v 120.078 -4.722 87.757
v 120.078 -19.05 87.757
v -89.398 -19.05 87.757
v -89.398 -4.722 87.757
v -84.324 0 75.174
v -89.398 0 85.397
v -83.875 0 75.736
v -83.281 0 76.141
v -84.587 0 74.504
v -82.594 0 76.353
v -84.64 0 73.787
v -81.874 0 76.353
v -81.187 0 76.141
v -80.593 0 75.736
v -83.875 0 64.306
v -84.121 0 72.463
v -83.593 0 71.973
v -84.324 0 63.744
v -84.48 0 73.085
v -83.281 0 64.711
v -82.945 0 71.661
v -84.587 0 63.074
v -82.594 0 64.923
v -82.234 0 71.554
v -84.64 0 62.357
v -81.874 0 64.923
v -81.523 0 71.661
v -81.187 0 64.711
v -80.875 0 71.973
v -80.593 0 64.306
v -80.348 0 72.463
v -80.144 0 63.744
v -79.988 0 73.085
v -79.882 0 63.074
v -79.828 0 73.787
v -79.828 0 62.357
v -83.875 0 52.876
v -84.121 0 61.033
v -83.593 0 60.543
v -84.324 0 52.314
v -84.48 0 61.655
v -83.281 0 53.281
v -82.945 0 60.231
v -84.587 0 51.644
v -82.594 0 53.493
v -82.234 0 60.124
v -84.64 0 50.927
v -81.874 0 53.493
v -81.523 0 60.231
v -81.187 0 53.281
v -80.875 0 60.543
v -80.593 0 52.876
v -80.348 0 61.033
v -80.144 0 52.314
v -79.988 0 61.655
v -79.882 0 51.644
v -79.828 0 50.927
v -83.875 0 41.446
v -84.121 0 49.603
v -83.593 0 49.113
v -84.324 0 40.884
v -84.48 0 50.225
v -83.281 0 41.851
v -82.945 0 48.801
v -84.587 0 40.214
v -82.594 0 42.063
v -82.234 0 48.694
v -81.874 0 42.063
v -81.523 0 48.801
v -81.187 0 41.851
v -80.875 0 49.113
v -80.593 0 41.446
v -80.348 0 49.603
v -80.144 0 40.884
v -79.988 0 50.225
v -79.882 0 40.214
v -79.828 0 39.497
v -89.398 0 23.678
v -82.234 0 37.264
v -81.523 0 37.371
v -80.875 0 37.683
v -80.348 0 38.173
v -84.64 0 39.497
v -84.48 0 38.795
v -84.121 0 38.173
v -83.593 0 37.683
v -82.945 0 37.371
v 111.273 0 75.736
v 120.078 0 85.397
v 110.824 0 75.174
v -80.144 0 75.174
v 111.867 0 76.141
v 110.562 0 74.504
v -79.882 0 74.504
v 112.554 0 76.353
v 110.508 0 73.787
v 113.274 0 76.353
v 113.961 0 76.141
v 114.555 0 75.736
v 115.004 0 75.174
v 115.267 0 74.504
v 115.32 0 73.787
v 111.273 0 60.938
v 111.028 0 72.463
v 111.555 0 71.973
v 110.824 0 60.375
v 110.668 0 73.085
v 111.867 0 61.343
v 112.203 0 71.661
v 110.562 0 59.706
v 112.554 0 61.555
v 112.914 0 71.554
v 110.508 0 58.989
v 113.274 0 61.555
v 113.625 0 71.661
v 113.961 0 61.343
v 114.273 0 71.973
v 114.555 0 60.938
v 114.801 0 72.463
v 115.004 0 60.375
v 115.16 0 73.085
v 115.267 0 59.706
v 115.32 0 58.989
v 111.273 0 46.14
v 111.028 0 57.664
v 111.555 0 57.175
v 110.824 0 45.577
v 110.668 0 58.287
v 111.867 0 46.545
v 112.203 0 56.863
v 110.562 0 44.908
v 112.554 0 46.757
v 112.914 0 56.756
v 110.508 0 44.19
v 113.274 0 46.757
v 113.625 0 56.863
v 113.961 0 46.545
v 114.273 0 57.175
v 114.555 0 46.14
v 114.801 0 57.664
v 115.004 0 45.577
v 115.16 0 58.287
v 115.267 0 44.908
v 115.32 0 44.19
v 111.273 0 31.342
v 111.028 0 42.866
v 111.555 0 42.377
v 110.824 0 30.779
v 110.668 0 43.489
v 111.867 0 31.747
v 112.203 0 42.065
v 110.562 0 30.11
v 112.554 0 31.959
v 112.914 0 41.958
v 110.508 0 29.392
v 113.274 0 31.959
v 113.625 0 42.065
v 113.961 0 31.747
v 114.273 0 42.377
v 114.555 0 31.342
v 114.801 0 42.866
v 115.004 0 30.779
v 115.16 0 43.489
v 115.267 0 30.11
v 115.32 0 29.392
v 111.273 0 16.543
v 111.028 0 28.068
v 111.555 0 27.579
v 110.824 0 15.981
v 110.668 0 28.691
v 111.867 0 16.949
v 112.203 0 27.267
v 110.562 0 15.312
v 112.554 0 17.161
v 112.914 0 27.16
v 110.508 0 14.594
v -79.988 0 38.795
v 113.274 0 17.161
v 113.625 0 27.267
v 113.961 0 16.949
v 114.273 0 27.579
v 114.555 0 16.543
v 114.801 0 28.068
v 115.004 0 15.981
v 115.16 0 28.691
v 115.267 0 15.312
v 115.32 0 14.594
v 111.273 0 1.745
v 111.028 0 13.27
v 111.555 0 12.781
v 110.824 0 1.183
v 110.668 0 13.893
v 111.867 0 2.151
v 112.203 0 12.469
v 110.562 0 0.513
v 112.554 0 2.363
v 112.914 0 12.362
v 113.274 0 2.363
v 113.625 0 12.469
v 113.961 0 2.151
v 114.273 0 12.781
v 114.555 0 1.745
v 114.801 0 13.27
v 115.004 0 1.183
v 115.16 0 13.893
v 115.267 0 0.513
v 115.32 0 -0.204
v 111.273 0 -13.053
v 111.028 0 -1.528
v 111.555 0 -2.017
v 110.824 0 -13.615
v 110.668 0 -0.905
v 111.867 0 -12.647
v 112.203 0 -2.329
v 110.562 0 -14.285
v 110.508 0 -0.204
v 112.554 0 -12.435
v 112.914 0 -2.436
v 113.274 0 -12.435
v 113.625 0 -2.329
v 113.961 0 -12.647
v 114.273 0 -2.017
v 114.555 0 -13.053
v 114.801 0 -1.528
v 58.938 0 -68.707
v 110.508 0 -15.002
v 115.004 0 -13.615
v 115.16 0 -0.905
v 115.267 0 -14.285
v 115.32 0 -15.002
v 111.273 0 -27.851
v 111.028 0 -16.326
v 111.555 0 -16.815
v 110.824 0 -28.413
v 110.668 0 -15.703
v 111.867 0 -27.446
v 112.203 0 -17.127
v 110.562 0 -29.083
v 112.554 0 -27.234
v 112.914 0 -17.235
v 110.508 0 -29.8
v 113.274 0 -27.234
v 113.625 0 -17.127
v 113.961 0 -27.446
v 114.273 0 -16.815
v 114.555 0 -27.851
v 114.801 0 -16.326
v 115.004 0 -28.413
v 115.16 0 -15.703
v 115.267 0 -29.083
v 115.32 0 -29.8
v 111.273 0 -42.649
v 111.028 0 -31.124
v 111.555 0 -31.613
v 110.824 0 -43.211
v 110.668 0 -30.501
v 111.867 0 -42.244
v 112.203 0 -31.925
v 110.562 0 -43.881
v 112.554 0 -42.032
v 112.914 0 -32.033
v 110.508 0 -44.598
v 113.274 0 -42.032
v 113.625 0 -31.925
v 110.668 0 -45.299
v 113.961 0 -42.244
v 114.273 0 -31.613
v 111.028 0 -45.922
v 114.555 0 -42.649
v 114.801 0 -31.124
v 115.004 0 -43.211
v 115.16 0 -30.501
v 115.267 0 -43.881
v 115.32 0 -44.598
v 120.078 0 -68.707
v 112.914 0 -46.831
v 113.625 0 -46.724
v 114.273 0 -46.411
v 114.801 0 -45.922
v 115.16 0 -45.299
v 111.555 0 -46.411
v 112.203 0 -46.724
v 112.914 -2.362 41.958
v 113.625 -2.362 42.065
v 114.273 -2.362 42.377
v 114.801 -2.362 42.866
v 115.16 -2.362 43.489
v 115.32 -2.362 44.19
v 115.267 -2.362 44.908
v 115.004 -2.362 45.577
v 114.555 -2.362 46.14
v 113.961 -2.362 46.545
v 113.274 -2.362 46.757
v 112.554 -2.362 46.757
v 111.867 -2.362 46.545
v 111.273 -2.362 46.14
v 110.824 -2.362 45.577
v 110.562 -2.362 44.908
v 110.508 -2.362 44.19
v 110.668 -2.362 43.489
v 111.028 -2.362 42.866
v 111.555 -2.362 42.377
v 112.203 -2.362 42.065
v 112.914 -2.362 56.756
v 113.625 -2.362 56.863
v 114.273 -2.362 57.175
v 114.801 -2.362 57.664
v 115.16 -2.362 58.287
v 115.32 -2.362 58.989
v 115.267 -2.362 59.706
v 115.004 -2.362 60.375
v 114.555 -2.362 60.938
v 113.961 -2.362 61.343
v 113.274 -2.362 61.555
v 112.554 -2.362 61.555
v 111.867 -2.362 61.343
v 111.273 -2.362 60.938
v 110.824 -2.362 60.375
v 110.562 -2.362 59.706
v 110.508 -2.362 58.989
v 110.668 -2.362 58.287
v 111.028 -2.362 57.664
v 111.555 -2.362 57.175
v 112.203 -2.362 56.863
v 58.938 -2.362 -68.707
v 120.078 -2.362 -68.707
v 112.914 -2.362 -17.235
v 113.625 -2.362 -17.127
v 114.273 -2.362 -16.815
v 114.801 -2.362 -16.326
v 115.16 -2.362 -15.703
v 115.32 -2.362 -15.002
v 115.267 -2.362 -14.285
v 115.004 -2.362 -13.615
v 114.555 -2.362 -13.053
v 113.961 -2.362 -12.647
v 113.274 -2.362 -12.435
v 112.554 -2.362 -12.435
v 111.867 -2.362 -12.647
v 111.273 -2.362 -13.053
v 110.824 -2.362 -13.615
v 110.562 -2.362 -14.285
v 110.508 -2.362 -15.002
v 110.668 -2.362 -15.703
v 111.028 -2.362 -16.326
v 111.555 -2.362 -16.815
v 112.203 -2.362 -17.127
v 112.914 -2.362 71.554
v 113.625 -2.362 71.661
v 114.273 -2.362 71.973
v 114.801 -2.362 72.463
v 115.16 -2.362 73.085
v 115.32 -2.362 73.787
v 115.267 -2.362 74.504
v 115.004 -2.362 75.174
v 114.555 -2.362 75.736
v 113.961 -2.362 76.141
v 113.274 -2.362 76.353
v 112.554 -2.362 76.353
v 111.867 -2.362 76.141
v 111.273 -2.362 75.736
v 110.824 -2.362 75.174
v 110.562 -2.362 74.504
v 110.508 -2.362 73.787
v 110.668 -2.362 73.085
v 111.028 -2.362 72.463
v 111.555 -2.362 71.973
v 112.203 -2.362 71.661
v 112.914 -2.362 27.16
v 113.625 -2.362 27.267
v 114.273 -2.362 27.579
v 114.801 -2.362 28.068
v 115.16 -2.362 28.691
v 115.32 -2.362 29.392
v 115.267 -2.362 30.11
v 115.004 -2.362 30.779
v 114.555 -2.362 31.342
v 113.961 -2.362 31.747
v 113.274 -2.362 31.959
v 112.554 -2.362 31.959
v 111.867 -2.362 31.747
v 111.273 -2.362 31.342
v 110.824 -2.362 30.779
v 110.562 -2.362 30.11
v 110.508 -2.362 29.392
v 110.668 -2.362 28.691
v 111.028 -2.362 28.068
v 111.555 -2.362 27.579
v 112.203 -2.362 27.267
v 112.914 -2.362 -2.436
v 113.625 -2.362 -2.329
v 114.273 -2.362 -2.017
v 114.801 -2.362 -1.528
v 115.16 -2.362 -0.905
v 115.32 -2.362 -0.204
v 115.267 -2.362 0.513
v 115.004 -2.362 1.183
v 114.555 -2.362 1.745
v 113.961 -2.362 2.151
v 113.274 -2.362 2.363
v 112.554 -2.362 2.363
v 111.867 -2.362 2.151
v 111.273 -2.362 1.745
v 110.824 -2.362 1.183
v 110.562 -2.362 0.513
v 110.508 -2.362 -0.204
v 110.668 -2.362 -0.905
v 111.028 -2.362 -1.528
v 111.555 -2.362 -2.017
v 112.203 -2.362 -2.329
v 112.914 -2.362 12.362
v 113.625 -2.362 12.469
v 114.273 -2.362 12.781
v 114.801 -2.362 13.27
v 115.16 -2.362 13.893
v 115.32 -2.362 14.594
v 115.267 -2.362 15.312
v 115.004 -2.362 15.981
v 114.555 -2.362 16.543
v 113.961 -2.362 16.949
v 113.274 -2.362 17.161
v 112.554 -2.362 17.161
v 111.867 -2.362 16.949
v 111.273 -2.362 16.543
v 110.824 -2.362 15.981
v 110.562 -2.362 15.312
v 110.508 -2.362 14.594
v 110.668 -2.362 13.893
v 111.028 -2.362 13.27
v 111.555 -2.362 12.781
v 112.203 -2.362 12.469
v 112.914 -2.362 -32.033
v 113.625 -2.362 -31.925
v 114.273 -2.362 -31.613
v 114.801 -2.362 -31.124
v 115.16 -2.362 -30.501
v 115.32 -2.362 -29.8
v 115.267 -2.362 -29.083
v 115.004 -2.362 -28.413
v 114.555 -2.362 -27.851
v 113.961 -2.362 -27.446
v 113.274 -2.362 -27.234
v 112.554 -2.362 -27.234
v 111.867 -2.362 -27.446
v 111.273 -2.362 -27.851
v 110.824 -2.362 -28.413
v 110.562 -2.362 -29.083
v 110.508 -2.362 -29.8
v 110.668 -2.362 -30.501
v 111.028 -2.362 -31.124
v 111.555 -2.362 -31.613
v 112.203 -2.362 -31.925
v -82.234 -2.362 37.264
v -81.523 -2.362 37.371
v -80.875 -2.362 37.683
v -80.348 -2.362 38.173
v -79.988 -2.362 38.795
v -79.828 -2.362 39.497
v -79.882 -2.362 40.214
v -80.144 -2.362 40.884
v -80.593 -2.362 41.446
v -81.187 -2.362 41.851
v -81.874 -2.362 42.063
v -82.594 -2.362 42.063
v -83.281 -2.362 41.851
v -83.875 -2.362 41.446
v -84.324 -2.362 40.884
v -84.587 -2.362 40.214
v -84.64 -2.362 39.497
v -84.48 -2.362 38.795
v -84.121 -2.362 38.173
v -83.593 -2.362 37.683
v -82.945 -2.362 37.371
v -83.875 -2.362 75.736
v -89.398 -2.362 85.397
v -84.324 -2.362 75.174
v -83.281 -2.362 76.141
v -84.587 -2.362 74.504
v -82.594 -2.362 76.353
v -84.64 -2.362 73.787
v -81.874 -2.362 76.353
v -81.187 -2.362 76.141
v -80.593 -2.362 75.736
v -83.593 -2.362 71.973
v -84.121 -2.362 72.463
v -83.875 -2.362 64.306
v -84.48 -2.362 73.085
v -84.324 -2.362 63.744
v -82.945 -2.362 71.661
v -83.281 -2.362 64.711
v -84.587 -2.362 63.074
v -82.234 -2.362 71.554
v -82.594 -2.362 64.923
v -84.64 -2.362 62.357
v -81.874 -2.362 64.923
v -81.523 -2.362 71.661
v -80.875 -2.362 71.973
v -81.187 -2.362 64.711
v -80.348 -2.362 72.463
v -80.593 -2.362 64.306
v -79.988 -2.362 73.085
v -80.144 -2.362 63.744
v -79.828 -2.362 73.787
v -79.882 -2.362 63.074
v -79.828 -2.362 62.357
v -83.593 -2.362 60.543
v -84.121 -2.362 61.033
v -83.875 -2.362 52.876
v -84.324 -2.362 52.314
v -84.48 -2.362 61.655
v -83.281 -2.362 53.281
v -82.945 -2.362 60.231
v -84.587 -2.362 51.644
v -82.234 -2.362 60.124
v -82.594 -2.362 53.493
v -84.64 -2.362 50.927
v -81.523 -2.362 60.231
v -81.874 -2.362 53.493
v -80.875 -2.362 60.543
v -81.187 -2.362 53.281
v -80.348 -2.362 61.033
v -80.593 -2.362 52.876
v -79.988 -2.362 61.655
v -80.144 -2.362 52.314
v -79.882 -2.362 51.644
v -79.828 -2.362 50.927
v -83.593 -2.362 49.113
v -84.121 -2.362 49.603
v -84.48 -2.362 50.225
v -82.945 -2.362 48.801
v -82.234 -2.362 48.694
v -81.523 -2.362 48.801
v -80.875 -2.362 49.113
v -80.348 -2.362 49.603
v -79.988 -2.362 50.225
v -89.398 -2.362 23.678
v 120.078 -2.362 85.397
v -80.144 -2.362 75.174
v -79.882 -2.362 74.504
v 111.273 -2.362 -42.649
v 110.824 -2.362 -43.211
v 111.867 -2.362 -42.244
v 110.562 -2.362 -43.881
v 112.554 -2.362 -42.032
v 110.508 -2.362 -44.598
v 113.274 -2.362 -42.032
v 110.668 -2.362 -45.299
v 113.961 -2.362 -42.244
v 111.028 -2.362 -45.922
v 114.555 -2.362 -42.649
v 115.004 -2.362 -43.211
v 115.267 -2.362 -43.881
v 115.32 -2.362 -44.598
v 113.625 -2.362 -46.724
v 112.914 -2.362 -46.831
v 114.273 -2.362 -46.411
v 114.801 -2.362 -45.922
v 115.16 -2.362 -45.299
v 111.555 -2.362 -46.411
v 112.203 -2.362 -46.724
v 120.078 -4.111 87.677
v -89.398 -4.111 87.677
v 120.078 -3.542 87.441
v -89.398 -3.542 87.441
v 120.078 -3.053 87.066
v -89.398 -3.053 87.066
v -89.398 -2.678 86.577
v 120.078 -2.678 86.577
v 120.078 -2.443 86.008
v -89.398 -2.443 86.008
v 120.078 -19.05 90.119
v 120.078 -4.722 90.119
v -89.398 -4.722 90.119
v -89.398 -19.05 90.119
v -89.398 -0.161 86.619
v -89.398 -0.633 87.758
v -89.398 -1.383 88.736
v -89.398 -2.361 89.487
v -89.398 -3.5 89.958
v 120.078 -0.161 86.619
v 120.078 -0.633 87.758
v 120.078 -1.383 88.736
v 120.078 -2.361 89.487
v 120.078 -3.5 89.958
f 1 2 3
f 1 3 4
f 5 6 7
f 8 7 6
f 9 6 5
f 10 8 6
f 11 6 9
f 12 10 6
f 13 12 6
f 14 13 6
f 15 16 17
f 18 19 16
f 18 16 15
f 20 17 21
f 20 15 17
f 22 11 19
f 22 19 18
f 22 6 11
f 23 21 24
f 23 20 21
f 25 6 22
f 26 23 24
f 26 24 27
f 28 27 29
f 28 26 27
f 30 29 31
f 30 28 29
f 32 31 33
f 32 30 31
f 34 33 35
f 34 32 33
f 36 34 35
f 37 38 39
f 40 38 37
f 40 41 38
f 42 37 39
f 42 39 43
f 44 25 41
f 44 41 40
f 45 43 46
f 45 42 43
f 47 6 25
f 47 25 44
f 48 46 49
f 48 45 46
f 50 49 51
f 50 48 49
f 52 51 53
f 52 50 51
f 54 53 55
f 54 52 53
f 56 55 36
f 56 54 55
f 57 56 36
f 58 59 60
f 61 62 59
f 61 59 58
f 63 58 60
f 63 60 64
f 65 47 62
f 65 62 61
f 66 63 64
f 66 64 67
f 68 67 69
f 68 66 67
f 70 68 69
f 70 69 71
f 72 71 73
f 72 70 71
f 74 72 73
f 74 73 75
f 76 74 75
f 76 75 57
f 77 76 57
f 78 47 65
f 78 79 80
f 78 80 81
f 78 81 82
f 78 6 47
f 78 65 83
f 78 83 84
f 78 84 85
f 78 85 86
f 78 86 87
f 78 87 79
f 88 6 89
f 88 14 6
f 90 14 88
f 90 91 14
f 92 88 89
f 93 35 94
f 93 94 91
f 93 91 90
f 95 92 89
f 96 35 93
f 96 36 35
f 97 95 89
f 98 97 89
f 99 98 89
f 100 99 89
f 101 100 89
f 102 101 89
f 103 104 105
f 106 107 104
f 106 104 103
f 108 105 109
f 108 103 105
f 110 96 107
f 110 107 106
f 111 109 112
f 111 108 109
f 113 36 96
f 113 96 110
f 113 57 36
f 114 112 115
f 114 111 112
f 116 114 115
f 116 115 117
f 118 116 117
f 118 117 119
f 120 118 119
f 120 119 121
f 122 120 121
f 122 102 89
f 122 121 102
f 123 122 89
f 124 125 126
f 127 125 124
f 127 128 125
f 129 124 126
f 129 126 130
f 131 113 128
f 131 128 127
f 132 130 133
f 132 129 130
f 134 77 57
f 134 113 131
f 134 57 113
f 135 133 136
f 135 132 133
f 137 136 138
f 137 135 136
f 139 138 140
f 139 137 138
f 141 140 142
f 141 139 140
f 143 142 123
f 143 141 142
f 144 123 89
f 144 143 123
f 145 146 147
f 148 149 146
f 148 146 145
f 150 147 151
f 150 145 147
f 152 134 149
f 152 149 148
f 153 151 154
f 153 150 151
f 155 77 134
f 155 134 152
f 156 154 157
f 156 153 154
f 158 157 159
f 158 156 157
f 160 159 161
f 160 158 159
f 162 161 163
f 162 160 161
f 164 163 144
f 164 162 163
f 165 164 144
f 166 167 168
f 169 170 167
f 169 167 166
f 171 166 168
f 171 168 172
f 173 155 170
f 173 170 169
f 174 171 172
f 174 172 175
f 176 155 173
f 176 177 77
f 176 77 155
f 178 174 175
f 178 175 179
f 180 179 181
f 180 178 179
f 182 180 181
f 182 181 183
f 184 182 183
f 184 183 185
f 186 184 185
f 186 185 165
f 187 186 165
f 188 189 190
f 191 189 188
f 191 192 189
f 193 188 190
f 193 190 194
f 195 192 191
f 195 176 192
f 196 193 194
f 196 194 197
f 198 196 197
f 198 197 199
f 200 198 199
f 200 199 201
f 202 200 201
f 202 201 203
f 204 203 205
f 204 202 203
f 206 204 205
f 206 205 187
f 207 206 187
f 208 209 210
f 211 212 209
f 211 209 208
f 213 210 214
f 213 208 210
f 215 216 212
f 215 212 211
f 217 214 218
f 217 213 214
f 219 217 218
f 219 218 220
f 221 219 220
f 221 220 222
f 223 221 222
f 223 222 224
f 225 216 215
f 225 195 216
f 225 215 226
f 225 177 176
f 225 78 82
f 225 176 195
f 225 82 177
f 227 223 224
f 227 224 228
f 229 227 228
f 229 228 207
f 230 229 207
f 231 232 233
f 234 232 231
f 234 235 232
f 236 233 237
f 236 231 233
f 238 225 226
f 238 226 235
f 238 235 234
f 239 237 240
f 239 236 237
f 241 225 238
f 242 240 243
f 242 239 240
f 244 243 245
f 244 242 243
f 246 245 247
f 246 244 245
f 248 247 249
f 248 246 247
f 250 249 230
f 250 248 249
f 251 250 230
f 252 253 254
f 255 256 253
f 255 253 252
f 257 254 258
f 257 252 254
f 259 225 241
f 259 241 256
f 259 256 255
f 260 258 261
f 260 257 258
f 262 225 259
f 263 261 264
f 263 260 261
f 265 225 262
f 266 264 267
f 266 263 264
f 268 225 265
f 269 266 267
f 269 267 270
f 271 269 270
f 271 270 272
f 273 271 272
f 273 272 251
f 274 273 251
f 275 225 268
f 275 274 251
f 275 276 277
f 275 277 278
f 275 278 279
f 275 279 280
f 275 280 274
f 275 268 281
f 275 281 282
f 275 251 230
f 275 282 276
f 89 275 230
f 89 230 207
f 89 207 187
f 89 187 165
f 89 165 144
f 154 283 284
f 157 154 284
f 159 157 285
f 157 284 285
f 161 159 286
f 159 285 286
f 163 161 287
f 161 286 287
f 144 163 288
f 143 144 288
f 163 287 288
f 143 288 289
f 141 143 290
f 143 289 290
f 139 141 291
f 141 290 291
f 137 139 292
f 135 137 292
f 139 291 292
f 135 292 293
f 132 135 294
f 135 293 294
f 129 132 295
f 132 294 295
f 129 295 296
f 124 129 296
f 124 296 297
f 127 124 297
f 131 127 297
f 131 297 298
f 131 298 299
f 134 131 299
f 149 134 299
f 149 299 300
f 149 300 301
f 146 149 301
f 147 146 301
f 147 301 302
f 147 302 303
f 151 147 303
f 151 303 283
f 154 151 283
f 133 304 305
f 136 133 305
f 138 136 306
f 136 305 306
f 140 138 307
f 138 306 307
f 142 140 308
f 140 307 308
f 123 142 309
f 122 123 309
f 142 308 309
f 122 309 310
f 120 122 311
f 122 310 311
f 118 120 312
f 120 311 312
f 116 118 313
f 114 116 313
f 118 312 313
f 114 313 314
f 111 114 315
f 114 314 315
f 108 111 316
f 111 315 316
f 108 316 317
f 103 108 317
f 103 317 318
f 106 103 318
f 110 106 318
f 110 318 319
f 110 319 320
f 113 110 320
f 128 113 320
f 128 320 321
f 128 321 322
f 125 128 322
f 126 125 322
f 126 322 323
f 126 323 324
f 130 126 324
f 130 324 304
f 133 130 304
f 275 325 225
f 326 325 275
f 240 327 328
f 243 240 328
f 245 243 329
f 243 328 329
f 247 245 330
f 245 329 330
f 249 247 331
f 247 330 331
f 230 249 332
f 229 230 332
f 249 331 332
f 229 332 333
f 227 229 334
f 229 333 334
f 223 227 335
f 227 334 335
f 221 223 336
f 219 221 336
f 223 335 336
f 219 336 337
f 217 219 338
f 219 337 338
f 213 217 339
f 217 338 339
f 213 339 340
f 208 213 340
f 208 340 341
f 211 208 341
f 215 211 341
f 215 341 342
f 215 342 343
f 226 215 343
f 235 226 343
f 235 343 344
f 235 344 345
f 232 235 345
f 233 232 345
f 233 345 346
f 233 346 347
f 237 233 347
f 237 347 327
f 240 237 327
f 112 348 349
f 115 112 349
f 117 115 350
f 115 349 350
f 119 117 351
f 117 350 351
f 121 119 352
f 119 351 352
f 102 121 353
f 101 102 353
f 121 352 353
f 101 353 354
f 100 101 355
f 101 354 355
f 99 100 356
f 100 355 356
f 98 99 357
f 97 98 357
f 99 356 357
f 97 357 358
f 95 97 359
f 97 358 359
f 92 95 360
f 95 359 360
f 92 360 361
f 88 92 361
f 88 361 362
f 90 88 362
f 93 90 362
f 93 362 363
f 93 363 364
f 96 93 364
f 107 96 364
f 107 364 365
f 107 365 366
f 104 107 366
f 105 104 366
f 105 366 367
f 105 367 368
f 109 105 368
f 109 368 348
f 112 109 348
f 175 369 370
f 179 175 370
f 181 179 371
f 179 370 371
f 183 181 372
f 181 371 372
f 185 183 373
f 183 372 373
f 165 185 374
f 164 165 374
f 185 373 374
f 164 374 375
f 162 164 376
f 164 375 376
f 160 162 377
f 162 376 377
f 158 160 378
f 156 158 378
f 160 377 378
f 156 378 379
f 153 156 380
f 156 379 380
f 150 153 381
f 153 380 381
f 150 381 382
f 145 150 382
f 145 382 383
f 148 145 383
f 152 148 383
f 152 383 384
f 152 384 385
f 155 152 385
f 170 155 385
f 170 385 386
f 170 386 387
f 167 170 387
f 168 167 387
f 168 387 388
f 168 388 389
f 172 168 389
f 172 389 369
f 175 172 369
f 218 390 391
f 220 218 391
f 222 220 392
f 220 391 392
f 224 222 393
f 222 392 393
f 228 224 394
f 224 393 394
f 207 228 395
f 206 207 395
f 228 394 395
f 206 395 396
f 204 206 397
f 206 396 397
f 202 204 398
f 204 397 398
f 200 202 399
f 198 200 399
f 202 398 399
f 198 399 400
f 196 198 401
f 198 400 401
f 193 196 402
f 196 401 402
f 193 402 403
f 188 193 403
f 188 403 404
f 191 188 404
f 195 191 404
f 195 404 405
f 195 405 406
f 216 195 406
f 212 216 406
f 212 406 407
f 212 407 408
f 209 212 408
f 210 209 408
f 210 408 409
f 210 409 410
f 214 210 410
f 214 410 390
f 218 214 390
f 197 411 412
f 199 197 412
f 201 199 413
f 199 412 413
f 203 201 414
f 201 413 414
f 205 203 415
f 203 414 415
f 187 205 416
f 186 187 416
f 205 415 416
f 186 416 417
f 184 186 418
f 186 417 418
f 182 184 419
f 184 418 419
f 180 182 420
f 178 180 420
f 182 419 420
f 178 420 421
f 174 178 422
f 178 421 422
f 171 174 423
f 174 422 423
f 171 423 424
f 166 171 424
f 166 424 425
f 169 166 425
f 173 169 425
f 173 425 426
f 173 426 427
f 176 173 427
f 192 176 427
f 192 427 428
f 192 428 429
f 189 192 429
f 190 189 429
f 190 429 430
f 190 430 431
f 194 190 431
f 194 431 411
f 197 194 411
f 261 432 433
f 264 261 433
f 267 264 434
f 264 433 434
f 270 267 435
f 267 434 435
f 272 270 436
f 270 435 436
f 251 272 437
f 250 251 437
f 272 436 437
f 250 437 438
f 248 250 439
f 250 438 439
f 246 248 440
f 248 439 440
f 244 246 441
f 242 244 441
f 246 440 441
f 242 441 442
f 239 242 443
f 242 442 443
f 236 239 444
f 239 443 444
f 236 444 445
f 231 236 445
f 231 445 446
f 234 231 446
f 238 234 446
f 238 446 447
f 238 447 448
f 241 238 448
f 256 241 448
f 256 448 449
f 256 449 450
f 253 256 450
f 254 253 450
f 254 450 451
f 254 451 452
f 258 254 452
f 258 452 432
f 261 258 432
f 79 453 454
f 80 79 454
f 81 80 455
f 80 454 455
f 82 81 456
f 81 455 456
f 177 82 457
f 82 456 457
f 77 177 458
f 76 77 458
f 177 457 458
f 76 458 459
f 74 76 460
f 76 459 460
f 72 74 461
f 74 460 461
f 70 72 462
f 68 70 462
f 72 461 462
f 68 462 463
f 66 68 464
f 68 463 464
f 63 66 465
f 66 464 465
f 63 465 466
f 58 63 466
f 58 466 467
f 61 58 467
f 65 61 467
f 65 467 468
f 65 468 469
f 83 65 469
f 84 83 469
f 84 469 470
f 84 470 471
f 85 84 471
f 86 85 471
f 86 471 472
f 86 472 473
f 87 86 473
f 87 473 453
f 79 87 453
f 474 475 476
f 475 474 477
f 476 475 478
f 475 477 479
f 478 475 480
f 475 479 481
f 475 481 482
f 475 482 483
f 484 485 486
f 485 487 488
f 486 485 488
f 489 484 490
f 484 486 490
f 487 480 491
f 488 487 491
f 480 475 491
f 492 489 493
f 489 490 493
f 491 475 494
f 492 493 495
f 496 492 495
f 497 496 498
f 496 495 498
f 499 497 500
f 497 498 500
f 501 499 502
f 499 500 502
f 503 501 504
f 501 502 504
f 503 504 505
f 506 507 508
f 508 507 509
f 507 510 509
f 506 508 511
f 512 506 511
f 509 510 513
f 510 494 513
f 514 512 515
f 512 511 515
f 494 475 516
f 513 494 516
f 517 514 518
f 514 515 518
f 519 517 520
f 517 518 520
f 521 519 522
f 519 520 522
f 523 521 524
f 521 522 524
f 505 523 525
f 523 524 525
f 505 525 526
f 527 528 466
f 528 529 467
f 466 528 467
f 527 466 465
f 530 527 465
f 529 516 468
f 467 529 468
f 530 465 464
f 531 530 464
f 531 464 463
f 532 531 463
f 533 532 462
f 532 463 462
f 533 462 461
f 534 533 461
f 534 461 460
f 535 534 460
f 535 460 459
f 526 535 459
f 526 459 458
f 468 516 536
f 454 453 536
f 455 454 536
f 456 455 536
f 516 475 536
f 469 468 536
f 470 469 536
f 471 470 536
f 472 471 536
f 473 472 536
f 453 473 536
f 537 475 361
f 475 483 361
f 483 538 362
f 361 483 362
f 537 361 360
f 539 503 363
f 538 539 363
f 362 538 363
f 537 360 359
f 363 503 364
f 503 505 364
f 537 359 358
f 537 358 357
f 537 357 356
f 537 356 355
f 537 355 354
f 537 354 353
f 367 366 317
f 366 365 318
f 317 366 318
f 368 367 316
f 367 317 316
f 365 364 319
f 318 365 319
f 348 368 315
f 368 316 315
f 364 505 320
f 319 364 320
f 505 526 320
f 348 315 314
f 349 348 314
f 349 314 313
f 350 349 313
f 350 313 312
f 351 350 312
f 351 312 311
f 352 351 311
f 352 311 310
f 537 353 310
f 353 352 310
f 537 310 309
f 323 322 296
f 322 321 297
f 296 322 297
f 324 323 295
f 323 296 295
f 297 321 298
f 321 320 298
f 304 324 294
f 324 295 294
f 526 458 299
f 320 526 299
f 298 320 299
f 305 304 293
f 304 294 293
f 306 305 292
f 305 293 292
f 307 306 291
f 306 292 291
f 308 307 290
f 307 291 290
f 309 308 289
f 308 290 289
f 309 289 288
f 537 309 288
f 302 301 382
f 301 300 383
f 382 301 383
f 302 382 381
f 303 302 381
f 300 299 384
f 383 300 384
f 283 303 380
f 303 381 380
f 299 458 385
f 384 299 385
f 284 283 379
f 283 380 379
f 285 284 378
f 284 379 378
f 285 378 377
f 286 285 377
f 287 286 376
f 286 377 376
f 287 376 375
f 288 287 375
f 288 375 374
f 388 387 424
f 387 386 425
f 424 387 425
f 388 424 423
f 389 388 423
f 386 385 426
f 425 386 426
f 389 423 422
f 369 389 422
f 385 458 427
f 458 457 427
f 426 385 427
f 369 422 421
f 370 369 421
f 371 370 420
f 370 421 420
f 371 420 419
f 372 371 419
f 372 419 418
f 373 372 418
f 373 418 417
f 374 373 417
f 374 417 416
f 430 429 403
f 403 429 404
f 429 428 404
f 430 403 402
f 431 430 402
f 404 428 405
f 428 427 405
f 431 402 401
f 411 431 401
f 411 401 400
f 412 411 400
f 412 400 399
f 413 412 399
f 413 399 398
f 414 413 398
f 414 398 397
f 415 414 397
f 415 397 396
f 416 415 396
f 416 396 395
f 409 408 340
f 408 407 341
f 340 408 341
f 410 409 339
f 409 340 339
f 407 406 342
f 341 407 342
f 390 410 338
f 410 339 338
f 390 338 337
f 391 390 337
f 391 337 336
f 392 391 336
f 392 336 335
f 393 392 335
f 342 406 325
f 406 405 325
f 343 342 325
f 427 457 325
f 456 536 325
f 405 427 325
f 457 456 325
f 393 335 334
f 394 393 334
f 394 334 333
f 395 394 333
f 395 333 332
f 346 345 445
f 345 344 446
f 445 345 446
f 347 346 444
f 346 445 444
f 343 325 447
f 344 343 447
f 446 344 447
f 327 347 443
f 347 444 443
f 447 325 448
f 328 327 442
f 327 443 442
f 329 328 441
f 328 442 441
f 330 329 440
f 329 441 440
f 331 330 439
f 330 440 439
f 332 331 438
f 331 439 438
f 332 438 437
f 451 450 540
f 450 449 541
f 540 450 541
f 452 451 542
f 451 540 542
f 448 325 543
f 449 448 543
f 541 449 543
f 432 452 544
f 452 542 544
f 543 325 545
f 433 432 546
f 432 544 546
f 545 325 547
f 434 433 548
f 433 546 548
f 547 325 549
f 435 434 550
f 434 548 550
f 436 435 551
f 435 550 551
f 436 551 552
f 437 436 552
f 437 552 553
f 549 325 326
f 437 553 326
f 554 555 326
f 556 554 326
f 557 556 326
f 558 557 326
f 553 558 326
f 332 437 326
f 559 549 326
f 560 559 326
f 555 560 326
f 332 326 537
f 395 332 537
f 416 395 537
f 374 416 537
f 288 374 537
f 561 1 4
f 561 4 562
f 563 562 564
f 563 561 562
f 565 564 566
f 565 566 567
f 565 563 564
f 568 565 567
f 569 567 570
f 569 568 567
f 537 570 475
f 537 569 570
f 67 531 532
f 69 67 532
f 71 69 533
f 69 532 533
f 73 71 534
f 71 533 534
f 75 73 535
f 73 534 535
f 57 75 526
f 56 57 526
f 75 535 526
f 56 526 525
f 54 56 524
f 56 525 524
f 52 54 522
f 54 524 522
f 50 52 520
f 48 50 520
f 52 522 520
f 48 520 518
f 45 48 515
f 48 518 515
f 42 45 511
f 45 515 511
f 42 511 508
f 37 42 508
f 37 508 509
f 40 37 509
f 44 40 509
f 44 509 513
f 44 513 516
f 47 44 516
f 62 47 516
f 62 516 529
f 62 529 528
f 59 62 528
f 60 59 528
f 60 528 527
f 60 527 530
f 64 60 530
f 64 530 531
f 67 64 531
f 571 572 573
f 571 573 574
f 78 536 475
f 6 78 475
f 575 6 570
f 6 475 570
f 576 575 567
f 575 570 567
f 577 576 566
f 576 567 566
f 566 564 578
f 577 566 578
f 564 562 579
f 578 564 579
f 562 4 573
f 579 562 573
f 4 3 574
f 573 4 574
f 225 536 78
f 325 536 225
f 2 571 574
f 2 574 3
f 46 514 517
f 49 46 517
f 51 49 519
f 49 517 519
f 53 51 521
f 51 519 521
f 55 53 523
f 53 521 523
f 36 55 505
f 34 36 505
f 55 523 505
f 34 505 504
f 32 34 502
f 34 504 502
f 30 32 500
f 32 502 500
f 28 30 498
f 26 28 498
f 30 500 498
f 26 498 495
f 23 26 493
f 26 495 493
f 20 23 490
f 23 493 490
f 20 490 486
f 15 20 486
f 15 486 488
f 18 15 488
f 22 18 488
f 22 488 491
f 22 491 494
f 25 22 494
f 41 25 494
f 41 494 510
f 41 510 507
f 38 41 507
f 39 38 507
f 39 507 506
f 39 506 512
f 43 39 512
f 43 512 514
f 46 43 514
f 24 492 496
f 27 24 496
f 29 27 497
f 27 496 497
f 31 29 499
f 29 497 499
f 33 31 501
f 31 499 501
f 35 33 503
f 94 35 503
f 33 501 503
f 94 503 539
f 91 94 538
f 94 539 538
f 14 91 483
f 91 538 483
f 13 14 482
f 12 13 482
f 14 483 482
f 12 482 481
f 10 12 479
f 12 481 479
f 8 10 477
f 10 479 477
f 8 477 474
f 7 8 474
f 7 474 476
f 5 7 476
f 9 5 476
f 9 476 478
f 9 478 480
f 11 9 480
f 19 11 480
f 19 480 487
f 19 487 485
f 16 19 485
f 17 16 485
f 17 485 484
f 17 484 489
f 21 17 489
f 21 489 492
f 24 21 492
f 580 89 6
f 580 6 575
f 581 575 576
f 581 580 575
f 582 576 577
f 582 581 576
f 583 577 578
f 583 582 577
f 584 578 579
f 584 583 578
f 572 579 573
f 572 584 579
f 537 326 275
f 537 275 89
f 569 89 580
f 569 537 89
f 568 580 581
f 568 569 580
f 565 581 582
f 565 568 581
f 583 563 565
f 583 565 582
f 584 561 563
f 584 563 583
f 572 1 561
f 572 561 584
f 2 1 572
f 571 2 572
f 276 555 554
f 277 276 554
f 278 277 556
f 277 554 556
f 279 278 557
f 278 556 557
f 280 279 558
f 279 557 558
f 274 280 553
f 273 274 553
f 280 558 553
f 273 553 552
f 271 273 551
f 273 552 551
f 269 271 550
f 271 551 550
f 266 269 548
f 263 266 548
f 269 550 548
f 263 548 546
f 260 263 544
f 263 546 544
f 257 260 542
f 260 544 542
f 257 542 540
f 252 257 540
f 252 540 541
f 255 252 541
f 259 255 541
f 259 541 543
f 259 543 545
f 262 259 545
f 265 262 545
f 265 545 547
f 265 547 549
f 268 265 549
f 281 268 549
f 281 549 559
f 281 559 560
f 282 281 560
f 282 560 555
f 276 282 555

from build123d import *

# Parameters (mm, degrees)
SKETCH1_W                    = 209.476
SKETCH1_H                    = 175.514
BASE_FLANGE1_DEPTH           = 2.3622
EDGE_FLANGE4_STRIP_W         = 14.1688
EDGE_FLANGE4_STRIP_H         = 2.3622
EDGE_FLANGE4_STRIP_CUT_DEPTH = 209.476
EDGE_FLANGE4_DEPTH           = 209.476
CUT_EXTRUDE1_DEPTH           = 152.058528265
SKETCH38_R                   = 2.413
CUT_EXTRUDE2_DEPTH           = 152.058528265
SKETCH39_R                   = 2.413
CUT_EXTRUDE3_DEPTH           = 152.058528265


# Sheet-metal steps are written as plain solids
with BuildPart() as part:
    # Sketch1 → Base-Flange1 (new body)
    with BuildSketch(Plane(origin=(0, 0, 0), x_dir=(1, 0, 0), z_dir=(0, 1, 0))):
        with Locations((15.34, 0)):
            Rectangle(SKETCH1_W, SKETCH1_H)
    extrude(amount=-BASE_FLANGE1_DEPTH)

    # Edge-Flange4 strip (across the edge) → Edge-Flange4 strip cut (cut)
    with BuildSketch(Plane(origin=(120.078, -2.3622, 87.757), x_dir=(0, 0, -1), z_dir=(-1, 0, 0))):
        with Locations((-4.7244, -1.1811)):
            Rectangle(EDGE_FLANGE4_STRIP_W, EDGE_FLANGE4_STRIP_H)
    extrude(amount=EDGE_FLANGE4_STRIP_CUT_DEPTH, mode=Mode.SUBTRACT)

    # Edge-Flange4 section (across the edge) → Edge-Flange4 (add)
    with BuildSketch(Plane(origin=(120.078, -2.3622, 87.757), x_dir=(0, 0, -1), z_dir=(-1, 0, 0))):
        with BuildLine():
            Line((-2.3622, 2.36), (-2.3622, 16.6878))
            Line((-2.3622, 16.6878), (0, 16.6878))
            Line((0, 16.6878), (0, 2.36))
            ThreePointArc((0, 2.36), (0.691227996, 0.691227996), (2.36, 0))
            Line((2.36, 0), (2.36, -2.3622))
            ThreePointArc((2.36, -2.3622), (-0.979099642, -0.979099642), (-2.3622, 2.36))
        make_face()
    extrude(amount=EDGE_FLANGE4_DEPTH)

    # Sketch36 → Cut-Extrude1 (cut, through all)
    with BuildSketch(Plane.XZ.offset(2.3622)):
        Polygon((-94.1202, 26.6192), (58.938, -68.707), (140.022587244, -68.707), (140.022587244, -102.574234495), (-121.93122604, -102.574234495), (-121.93122604, 26.6192), align=None)
    extrude(amount=-CUT_EXTRUDE1_DEPTH, mode=Mode.SUBTRACT)

    # Sketch38 → Cut-Extrude2 (cut, through all)
    with BuildSketch(Plane.XZ.offset(2.3622)):
        with Locations(Location((-82.2341, 73.967, 0), (0, 0, 270))):
            Circle(SKETCH38_R)
        with Locations(Location((-82.2341, 62.537, 0), (0, 0, 270))):
            Circle(SKETCH38_R)
        with Locations(Location((-82.2341, 51.107, 0), (0, 0, 270))):
            Circle(SKETCH38_R)
        with Locations(Location((-82.2341, 39.677, 0), (0, 0, 270))):
            Circle(SKETCH38_R)
    extrude(amount=-CUT_EXTRUDE2_DEPTH, mode=Mode.SUBTRACT)

    # Sketch39 → Cut-Extrude3 (cut, through all)
    with BuildSketch(Plane.XZ.offset(2.3622)):
        with Locations(Location((112.9141, 73.967, 0), (0, 0, 270))):
            Circle(SKETCH39_R)
        with Locations(Location((112.9141, 59.168910638, 0), (0, 0, 270))):
            Circle(SKETCH39_R)
        with Locations(Location((112.9141, 44.370821275, 0), (0, 0, 270))):
            Circle(SKETCH39_R)
        with Locations(Location((112.9141, 29.572731913, 0), (0, 0, 270))):
            Circle(SKETCH39_R)
        with Locations(Location((112.9141, 14.774642551, 0), (0, 0, 270))):
            Circle(SKETCH39_R)
        with Locations(Location((112.9141, -0.023446812, 0), (0, 0, 270))):
            Circle(SKETCH39_R)
        with Locations(Location((112.9141, -14.821536174, 0), (0, 0, 270))):
            Circle(SKETCH39_R)
        with Locations(Location((112.9141, -29.619625536, 0), (0, 0, 270))):
            Circle(SKETCH39_R)
        with Locations(Location((112.9141, -44.417714899, 0), (0, 0, 270))):
            Circle(SKETCH39_R)
    extrude(amount=-CUT_EXTRUDE3_DEPTH, mode=Mode.SUBTRACT)


solid = part.part
